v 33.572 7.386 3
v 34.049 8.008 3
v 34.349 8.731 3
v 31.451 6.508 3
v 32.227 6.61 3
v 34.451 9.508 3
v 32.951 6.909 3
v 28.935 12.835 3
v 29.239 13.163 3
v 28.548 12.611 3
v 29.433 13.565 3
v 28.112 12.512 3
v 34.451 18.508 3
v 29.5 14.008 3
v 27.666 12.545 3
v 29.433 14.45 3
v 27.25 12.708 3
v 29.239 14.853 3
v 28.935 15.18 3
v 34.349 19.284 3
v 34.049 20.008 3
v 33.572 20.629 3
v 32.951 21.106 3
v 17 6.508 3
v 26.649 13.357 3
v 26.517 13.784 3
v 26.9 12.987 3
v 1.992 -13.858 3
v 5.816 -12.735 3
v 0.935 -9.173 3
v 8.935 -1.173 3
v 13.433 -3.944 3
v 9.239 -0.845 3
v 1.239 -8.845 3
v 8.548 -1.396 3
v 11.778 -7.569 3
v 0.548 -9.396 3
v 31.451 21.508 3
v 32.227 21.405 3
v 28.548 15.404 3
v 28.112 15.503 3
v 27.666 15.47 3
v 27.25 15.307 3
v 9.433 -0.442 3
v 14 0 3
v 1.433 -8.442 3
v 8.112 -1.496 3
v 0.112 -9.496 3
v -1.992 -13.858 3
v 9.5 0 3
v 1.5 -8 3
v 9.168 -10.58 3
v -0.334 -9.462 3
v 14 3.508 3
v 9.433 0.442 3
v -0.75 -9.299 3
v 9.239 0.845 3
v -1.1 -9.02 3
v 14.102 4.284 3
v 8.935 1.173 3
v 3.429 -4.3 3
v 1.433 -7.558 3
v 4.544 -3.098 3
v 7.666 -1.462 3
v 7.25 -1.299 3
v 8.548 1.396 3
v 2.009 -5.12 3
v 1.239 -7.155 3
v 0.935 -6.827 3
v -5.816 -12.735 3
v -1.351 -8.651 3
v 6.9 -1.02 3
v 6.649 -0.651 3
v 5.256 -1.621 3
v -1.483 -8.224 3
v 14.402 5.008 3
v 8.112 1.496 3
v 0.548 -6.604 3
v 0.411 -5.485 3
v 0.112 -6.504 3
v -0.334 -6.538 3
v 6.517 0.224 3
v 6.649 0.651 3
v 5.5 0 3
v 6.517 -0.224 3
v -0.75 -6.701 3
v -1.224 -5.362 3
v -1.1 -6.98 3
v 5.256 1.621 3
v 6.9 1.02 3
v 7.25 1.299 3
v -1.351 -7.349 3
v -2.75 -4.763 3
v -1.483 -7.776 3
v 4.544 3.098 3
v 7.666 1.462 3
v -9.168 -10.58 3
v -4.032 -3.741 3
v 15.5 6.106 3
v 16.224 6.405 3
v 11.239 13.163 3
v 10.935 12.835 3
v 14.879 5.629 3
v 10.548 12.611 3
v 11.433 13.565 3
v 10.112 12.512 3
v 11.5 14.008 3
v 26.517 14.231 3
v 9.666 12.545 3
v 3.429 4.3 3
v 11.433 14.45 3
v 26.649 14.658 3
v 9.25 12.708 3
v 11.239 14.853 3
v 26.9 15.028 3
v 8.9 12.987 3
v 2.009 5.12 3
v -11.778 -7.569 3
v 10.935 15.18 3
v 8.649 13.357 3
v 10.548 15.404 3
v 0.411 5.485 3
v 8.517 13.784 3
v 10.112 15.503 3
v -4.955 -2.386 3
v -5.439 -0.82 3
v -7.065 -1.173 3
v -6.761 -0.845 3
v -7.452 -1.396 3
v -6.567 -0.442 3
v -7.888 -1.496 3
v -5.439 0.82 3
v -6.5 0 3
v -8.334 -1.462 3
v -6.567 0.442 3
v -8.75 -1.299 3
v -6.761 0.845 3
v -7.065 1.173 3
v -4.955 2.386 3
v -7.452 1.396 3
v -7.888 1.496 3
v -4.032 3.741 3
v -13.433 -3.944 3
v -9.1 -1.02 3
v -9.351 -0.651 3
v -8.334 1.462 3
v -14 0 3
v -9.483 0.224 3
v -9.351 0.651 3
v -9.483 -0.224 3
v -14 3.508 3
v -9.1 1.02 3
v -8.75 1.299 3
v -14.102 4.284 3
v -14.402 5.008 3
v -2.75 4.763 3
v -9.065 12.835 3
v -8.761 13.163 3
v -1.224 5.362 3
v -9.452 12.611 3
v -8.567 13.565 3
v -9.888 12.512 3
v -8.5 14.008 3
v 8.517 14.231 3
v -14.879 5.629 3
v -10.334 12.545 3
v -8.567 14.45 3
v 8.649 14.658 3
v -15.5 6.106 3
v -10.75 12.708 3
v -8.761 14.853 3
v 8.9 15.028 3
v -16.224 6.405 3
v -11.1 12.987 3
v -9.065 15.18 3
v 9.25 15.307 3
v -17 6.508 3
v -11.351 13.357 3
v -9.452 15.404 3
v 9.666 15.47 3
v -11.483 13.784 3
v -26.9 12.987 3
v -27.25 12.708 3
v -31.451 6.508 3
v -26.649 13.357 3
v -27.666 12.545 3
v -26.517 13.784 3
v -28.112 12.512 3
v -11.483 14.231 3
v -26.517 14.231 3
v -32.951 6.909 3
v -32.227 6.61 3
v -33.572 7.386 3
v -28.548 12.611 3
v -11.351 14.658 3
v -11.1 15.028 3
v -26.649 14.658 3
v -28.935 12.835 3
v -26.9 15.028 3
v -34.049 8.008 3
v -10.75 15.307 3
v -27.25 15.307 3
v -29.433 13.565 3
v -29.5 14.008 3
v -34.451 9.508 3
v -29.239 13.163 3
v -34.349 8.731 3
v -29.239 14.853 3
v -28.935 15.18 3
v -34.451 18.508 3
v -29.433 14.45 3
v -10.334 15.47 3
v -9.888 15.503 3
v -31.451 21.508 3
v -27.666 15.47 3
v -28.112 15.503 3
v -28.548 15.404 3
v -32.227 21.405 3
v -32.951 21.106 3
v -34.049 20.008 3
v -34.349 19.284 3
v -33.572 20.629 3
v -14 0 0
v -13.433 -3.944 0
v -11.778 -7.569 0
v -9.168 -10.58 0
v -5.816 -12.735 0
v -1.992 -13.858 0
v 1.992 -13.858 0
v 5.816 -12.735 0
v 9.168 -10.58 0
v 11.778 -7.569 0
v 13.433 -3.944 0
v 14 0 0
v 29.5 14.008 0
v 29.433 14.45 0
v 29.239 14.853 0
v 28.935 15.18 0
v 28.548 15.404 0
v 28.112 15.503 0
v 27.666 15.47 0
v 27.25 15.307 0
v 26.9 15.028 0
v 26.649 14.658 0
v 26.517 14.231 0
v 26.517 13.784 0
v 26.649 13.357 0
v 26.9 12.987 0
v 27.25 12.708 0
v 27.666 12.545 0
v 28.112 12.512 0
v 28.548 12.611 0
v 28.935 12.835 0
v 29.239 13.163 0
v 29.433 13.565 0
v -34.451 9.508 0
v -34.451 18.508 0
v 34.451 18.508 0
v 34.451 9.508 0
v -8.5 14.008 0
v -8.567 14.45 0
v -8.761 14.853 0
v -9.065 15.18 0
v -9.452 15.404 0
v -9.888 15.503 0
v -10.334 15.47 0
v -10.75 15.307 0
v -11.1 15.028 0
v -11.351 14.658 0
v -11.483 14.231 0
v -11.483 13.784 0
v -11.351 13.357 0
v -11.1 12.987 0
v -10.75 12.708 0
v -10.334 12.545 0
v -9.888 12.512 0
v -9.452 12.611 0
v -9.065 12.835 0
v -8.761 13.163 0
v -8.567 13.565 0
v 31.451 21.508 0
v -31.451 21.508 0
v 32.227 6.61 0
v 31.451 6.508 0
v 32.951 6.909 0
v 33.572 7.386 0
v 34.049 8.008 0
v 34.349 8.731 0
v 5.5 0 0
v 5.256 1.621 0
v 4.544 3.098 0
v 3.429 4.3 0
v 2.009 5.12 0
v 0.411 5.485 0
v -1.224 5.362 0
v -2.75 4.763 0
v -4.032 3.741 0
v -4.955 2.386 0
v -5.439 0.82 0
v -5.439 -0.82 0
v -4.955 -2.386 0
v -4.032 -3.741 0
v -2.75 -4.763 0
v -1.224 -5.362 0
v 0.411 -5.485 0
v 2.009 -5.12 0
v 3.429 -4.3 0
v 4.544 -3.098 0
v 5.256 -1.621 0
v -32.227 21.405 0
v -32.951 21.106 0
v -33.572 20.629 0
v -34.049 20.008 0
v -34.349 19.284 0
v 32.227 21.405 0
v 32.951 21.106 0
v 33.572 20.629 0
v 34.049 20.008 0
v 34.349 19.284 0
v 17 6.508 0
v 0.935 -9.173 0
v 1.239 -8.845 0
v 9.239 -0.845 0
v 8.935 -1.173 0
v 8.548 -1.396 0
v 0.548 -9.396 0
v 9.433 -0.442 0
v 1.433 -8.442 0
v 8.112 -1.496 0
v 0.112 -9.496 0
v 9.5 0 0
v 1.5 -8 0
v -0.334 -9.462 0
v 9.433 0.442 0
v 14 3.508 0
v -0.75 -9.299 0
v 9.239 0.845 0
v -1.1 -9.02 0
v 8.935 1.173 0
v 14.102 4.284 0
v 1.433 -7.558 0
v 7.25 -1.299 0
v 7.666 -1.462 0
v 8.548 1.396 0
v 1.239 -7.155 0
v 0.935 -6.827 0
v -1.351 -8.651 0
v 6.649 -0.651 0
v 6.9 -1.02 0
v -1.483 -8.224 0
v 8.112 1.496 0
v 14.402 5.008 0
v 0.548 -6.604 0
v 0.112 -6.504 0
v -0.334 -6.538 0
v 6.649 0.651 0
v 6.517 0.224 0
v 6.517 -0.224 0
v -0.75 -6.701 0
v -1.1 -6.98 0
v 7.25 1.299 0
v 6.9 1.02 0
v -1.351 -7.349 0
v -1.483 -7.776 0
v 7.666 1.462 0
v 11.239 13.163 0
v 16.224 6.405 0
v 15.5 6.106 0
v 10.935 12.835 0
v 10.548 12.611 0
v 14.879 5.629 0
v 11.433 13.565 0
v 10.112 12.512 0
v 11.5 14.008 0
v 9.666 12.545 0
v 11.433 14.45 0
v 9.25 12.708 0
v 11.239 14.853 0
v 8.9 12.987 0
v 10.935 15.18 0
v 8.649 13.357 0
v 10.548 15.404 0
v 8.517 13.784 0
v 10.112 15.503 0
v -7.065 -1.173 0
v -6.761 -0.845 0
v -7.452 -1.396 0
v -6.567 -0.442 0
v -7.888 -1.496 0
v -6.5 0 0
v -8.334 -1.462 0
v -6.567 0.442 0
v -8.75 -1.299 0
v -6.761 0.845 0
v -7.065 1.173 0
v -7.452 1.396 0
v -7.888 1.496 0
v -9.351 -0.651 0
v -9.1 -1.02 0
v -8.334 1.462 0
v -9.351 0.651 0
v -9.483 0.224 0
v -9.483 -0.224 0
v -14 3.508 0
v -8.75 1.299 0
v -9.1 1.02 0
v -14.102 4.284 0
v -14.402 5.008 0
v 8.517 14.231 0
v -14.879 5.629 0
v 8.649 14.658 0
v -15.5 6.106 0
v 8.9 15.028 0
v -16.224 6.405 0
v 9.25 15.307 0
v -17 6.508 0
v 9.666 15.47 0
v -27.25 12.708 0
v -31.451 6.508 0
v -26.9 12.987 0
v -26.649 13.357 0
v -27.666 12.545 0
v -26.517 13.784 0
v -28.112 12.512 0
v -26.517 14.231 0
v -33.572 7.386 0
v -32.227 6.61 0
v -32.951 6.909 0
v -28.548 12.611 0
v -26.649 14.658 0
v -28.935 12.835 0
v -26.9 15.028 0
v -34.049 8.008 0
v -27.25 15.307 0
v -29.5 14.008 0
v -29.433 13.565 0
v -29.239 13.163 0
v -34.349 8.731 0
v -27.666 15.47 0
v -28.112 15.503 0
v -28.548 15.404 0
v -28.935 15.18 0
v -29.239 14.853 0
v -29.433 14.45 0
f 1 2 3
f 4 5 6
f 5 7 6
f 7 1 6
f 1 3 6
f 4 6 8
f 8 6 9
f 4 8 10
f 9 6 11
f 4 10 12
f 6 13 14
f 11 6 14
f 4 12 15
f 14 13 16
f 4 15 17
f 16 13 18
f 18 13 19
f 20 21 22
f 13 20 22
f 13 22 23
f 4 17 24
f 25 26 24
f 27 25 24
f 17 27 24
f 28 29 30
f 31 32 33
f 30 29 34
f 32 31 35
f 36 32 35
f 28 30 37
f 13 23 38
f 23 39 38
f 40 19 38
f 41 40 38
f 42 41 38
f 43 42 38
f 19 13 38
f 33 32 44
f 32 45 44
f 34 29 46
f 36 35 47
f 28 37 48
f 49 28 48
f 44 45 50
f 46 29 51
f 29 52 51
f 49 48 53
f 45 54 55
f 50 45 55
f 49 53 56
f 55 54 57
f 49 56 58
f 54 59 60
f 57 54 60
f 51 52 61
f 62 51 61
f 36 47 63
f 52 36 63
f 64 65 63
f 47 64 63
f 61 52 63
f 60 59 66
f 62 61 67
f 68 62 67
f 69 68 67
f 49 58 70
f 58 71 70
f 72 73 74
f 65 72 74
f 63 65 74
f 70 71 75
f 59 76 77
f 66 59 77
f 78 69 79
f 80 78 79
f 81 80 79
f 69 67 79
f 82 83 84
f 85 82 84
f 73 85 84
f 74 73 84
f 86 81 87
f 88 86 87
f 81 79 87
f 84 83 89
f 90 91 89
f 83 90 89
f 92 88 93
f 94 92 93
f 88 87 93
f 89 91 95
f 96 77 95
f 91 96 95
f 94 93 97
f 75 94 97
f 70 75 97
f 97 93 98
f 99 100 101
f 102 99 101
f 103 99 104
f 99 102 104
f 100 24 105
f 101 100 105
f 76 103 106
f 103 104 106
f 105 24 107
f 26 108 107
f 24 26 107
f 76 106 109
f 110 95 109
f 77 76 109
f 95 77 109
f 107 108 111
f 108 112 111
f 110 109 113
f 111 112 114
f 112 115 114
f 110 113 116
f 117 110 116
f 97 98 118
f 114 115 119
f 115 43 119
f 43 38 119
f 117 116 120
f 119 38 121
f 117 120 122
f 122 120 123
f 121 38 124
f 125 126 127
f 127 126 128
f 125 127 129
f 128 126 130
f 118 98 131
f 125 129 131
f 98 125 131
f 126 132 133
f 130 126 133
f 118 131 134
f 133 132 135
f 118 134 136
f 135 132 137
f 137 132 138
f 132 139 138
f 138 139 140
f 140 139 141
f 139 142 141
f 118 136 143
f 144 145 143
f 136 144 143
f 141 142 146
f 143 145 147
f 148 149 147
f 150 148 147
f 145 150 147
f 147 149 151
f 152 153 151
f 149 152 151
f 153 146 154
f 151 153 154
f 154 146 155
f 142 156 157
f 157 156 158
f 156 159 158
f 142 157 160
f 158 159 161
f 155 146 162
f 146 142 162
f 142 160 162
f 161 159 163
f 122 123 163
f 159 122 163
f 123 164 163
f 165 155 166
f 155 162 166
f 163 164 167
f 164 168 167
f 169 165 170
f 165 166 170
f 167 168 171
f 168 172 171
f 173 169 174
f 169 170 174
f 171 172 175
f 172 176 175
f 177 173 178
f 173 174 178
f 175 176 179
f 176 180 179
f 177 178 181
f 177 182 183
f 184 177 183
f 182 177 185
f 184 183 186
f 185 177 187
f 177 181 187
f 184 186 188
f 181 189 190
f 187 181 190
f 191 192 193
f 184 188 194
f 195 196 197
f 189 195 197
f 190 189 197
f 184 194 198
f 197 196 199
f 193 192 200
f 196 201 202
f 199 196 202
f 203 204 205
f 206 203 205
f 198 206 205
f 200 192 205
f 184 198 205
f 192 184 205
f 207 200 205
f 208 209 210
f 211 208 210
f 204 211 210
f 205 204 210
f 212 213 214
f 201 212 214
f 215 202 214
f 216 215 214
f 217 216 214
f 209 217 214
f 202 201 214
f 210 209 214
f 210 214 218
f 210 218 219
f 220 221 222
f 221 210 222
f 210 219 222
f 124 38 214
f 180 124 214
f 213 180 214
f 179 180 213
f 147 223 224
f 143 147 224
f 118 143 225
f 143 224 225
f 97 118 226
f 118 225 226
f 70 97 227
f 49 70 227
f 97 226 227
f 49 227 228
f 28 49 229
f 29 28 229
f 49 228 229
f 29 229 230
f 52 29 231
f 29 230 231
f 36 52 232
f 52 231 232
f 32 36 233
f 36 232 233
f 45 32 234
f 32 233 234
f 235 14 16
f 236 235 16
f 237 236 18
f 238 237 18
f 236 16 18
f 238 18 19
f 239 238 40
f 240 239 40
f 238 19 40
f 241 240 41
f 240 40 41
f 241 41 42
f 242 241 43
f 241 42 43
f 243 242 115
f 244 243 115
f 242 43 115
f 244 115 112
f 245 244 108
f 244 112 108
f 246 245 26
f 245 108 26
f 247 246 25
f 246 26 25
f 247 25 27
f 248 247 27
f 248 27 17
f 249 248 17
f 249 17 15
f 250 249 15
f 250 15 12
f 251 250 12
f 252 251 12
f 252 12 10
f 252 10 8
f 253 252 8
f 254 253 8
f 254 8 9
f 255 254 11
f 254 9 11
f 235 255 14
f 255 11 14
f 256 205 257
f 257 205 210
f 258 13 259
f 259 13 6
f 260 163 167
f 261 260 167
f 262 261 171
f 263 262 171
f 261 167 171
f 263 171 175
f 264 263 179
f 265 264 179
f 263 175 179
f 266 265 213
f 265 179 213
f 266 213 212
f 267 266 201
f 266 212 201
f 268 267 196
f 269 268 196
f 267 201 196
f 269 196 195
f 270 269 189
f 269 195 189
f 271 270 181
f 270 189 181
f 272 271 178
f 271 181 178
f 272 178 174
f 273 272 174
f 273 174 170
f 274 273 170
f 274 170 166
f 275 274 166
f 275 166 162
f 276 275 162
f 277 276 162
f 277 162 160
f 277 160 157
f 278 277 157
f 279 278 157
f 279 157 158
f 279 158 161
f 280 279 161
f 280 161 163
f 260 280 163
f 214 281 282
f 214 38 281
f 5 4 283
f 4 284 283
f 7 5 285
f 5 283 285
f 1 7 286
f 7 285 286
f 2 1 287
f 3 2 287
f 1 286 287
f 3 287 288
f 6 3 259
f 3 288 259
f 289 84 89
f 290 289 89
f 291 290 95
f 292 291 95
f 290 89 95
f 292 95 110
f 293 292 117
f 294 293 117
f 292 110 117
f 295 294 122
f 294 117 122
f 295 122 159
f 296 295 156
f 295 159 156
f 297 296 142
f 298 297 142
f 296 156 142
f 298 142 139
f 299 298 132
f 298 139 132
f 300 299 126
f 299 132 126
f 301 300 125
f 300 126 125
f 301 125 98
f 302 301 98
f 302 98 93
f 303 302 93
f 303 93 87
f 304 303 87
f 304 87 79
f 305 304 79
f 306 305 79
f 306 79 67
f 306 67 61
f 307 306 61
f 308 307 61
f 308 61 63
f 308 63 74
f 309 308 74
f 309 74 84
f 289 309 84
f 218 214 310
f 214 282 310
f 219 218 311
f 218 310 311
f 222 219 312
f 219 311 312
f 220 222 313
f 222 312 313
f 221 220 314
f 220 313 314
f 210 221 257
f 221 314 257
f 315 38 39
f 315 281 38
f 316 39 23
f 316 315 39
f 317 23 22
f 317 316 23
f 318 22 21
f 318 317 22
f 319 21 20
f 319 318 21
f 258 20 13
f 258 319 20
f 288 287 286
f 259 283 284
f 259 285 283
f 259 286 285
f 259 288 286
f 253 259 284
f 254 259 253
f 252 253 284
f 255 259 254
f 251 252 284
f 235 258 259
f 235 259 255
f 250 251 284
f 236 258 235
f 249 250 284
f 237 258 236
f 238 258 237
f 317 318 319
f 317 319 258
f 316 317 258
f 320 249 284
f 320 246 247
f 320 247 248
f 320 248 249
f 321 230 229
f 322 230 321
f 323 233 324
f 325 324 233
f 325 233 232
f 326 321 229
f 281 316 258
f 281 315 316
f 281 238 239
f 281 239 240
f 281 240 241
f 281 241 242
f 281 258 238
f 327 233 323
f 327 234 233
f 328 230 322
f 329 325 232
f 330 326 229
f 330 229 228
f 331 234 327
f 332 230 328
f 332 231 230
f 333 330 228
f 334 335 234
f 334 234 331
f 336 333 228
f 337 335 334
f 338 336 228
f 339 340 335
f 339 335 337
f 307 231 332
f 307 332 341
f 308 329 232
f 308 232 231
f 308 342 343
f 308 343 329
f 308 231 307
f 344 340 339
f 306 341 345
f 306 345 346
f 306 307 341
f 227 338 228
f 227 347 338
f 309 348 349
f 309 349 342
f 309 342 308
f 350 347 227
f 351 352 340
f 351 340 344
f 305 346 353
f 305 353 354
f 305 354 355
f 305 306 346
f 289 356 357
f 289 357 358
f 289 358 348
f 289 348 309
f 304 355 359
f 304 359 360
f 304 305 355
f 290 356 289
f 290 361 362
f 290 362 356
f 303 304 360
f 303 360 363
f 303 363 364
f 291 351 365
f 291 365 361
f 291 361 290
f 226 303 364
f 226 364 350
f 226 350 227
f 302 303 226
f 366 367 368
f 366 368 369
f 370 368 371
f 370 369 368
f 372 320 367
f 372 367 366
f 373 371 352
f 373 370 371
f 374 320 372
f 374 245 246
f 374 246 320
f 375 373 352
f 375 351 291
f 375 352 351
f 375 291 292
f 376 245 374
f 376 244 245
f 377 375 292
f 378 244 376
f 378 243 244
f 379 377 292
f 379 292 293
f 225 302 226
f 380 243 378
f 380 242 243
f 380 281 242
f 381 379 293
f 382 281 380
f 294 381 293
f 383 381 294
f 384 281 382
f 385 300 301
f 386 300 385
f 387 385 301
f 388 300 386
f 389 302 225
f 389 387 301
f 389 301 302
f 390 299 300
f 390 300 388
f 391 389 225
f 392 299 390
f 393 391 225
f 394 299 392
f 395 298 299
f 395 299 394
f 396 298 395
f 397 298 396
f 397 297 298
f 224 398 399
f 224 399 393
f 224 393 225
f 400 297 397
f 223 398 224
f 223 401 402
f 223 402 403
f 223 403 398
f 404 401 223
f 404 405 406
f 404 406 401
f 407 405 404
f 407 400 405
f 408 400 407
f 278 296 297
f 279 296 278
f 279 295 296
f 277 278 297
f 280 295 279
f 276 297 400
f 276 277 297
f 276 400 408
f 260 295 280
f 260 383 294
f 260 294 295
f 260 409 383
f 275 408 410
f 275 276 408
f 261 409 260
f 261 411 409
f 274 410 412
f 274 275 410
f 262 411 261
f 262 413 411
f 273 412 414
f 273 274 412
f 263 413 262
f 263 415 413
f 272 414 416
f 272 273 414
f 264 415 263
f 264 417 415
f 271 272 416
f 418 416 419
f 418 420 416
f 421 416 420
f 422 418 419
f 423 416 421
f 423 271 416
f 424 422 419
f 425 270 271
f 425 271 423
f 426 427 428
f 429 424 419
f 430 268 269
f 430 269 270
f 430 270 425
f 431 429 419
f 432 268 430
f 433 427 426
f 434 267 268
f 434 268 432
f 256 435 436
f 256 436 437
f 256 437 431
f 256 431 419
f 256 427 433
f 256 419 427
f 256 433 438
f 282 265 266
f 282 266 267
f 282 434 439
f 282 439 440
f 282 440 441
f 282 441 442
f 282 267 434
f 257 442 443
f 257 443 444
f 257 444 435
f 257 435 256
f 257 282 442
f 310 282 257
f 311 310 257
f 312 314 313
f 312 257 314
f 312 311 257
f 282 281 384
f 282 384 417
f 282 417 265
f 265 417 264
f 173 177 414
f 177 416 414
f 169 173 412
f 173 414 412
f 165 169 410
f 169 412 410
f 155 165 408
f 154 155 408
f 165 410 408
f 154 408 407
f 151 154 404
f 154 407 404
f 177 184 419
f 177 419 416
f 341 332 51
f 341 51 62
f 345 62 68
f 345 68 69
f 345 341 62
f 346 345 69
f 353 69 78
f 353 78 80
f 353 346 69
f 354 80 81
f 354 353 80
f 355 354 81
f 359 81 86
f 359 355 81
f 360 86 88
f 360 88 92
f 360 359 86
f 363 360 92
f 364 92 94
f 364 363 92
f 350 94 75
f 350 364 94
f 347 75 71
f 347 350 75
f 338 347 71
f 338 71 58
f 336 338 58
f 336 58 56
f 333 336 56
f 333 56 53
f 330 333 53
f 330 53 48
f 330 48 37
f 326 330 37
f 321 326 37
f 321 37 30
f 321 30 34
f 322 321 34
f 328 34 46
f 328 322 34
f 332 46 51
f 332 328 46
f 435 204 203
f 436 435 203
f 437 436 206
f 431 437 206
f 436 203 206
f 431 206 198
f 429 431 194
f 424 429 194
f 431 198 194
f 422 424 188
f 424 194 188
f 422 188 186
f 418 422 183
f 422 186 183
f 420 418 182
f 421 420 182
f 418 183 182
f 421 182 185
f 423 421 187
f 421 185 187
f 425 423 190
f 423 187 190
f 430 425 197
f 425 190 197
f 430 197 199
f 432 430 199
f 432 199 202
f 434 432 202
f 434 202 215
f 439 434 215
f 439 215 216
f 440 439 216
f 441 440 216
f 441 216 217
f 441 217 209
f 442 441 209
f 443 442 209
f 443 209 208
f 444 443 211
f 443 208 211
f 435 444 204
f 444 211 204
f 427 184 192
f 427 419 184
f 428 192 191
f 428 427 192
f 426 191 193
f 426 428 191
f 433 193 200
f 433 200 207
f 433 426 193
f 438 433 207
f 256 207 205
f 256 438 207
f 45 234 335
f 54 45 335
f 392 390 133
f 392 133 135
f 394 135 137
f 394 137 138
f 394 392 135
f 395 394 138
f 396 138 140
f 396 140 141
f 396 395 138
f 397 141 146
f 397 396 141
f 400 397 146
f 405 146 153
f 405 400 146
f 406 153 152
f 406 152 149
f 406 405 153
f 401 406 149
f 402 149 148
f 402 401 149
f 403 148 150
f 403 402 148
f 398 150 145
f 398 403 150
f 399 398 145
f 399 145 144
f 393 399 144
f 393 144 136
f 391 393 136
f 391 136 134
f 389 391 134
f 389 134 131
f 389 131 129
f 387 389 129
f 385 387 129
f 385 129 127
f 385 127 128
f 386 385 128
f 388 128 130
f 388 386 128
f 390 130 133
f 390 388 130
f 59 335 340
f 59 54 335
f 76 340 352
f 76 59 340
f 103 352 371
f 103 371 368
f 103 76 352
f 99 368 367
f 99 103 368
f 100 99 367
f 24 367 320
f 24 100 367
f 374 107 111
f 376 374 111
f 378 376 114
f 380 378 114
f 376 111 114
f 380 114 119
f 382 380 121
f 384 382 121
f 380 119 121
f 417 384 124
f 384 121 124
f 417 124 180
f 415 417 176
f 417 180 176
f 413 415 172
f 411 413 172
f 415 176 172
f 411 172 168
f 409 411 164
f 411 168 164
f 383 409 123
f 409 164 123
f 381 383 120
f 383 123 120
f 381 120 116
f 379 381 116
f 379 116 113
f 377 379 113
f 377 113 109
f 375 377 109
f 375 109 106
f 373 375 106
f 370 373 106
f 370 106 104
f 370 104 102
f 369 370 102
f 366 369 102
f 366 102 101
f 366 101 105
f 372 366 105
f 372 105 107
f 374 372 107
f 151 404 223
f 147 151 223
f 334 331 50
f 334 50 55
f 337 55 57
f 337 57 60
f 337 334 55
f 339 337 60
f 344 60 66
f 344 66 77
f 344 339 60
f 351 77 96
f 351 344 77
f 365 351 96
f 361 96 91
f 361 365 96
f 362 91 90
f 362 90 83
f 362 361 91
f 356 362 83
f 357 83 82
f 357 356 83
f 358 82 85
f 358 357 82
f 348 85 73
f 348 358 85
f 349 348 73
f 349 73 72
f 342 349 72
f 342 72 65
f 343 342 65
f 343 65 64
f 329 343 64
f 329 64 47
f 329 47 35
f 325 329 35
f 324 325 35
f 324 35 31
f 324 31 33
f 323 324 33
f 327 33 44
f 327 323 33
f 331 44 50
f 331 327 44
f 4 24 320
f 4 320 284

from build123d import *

# Parameters (mm, degrees)
SKETCH_1_R          = 14
SKETCH_1_R_2        = 1.5
EXTRUDE_1_DEPTH     = 3
SKETCH_2_R          = 5.5
CUT_EXTRUDE_1_DEPTH = 11
CUT_EXTRUDE_2_DEPTH = 11
SKETCH_6_R          = 1.5
CUT_EXTRUDE_3_DEPTH = 11
SKETCH_4_R          = 1.5
EXTRUDE_2_DEPTH     = 3
FILLET_1_R          = 3


with BuildPart() as part:
    # 草图1 → 凸台-拉伸1 (new body)
    # profile 1 of 2: a face of its own
    with BuildSketch(Plane.XY):
        with BuildLine():
            Line((-14, 27.287521581), (-14, 0))
            ThreePointArc((-14, 0), (0, 14), (14, 0))
            Line((14, 0), (14, 27.287521581))
            Line((14, 27.287521581), (-14, 27.287521581))
        make_face()
    # profile 2 of 2: a face of its own
    with BuildSketch(Plane.XY):
        Circle(SKETCH_1_R)
        with Locations((0, -8)):
            Circle(SKETCH_1_R_2, mode=Mode.SUBTRACT)
        with Locations((8, 0)):
            Circle(SKETCH_1_R_2, mode=Mode.SUBTRACT)
        with Locations((-8, 0)):
            Circle(SKETCH_1_R_2, mode=Mode.SUBTRACT)
    extrude(amount=EXTRUDE_1_DEPTH)

    # 草图2 → 切除-拉伸1 (cut)
    with BuildSketch(Plane.XY.offset(3)):
        Circle(SKETCH_2_R)
    extrude(amount=-CUT_EXTRUDE_1_DEPTH, mode=Mode.SUBTRACT)

    # 草图3 → 切除-拉伸2 (cut)
    with BuildSketch(Plane.XY.offset(3)):
        Polygon((14, 27.287521581), (22.040424941, 27.287521581), (22.040424941, 21.507521581), (-23.523215241, 21.507521581), (-23.523215241, 27.287521581), align=None)
    extrude(amount=-CUT_EXTRUDE_2_DEPTH, mode=Mode.SUBTRACT)

    # 草图6 → 切除-拉伸3 (cut)
    with BuildSketch(Plane.XY.offset(3)):
        with Locations((10, 14.007521581)):
            Circle(SKETCH_6_R)
        with Locations((-10, 14.007521581)):
            Circle(SKETCH_6_R)
    extrude(amount=-CUT_EXTRUDE_3_DEPTH, mode=Mode.SUBTRACT)

    # 草图4 → 凸台-拉伸2 (add)
    with BuildSketch(Plane.XY.offset(3)):
        Polygon((14, 21.507521581), (34.450975214, 21.507521581), (34.450975214, 6.507521581), (14, 6.507521581), (-14, 6.507521581), (-34.450975214, 6.507521581), (-34.450975214, 21.507521581), (-14, 21.507521581), align=None)
        with Locations((10, 14.007521581)):
            Circle(SKETCH_4_R, mode=Mode.SUBTRACT)
        with Locations((28, 14.007521581)):
            Circle(SKETCH_4_R, mode=Mode.SUBTRACT)
        with Locations((-10, 14.007521581)):
            Circle(SKETCH_4_R, mode=Mode.SUBTRACT)
        with Locations(Location((-28, 14.007521581, 0), (0, 0, 180))):
            Circle(SKETCH_4_R, mode=Mode.SUBTRACT)
    extrude(amount=-EXTRUDE_2_DEPTH)

    # 圆角1
    fillet_1_edges = [part.edges().sort_by_distance(p)[0] for p in [
        (-34.450975214, 21.507521581, 1.5),
        (-14, 6.507521581, 1.5),
        (34.450975214, 21.507521581, 1.5),
        (14, 6.507521581, 1.5),
        (34.450975214, 6.507521581, 1.5),
        (-34.450975214, 6.507521581, 1.5),
    ]]
    fillet(fillet_1_edges, radius=FILLET_1_R)


solid = part.part
